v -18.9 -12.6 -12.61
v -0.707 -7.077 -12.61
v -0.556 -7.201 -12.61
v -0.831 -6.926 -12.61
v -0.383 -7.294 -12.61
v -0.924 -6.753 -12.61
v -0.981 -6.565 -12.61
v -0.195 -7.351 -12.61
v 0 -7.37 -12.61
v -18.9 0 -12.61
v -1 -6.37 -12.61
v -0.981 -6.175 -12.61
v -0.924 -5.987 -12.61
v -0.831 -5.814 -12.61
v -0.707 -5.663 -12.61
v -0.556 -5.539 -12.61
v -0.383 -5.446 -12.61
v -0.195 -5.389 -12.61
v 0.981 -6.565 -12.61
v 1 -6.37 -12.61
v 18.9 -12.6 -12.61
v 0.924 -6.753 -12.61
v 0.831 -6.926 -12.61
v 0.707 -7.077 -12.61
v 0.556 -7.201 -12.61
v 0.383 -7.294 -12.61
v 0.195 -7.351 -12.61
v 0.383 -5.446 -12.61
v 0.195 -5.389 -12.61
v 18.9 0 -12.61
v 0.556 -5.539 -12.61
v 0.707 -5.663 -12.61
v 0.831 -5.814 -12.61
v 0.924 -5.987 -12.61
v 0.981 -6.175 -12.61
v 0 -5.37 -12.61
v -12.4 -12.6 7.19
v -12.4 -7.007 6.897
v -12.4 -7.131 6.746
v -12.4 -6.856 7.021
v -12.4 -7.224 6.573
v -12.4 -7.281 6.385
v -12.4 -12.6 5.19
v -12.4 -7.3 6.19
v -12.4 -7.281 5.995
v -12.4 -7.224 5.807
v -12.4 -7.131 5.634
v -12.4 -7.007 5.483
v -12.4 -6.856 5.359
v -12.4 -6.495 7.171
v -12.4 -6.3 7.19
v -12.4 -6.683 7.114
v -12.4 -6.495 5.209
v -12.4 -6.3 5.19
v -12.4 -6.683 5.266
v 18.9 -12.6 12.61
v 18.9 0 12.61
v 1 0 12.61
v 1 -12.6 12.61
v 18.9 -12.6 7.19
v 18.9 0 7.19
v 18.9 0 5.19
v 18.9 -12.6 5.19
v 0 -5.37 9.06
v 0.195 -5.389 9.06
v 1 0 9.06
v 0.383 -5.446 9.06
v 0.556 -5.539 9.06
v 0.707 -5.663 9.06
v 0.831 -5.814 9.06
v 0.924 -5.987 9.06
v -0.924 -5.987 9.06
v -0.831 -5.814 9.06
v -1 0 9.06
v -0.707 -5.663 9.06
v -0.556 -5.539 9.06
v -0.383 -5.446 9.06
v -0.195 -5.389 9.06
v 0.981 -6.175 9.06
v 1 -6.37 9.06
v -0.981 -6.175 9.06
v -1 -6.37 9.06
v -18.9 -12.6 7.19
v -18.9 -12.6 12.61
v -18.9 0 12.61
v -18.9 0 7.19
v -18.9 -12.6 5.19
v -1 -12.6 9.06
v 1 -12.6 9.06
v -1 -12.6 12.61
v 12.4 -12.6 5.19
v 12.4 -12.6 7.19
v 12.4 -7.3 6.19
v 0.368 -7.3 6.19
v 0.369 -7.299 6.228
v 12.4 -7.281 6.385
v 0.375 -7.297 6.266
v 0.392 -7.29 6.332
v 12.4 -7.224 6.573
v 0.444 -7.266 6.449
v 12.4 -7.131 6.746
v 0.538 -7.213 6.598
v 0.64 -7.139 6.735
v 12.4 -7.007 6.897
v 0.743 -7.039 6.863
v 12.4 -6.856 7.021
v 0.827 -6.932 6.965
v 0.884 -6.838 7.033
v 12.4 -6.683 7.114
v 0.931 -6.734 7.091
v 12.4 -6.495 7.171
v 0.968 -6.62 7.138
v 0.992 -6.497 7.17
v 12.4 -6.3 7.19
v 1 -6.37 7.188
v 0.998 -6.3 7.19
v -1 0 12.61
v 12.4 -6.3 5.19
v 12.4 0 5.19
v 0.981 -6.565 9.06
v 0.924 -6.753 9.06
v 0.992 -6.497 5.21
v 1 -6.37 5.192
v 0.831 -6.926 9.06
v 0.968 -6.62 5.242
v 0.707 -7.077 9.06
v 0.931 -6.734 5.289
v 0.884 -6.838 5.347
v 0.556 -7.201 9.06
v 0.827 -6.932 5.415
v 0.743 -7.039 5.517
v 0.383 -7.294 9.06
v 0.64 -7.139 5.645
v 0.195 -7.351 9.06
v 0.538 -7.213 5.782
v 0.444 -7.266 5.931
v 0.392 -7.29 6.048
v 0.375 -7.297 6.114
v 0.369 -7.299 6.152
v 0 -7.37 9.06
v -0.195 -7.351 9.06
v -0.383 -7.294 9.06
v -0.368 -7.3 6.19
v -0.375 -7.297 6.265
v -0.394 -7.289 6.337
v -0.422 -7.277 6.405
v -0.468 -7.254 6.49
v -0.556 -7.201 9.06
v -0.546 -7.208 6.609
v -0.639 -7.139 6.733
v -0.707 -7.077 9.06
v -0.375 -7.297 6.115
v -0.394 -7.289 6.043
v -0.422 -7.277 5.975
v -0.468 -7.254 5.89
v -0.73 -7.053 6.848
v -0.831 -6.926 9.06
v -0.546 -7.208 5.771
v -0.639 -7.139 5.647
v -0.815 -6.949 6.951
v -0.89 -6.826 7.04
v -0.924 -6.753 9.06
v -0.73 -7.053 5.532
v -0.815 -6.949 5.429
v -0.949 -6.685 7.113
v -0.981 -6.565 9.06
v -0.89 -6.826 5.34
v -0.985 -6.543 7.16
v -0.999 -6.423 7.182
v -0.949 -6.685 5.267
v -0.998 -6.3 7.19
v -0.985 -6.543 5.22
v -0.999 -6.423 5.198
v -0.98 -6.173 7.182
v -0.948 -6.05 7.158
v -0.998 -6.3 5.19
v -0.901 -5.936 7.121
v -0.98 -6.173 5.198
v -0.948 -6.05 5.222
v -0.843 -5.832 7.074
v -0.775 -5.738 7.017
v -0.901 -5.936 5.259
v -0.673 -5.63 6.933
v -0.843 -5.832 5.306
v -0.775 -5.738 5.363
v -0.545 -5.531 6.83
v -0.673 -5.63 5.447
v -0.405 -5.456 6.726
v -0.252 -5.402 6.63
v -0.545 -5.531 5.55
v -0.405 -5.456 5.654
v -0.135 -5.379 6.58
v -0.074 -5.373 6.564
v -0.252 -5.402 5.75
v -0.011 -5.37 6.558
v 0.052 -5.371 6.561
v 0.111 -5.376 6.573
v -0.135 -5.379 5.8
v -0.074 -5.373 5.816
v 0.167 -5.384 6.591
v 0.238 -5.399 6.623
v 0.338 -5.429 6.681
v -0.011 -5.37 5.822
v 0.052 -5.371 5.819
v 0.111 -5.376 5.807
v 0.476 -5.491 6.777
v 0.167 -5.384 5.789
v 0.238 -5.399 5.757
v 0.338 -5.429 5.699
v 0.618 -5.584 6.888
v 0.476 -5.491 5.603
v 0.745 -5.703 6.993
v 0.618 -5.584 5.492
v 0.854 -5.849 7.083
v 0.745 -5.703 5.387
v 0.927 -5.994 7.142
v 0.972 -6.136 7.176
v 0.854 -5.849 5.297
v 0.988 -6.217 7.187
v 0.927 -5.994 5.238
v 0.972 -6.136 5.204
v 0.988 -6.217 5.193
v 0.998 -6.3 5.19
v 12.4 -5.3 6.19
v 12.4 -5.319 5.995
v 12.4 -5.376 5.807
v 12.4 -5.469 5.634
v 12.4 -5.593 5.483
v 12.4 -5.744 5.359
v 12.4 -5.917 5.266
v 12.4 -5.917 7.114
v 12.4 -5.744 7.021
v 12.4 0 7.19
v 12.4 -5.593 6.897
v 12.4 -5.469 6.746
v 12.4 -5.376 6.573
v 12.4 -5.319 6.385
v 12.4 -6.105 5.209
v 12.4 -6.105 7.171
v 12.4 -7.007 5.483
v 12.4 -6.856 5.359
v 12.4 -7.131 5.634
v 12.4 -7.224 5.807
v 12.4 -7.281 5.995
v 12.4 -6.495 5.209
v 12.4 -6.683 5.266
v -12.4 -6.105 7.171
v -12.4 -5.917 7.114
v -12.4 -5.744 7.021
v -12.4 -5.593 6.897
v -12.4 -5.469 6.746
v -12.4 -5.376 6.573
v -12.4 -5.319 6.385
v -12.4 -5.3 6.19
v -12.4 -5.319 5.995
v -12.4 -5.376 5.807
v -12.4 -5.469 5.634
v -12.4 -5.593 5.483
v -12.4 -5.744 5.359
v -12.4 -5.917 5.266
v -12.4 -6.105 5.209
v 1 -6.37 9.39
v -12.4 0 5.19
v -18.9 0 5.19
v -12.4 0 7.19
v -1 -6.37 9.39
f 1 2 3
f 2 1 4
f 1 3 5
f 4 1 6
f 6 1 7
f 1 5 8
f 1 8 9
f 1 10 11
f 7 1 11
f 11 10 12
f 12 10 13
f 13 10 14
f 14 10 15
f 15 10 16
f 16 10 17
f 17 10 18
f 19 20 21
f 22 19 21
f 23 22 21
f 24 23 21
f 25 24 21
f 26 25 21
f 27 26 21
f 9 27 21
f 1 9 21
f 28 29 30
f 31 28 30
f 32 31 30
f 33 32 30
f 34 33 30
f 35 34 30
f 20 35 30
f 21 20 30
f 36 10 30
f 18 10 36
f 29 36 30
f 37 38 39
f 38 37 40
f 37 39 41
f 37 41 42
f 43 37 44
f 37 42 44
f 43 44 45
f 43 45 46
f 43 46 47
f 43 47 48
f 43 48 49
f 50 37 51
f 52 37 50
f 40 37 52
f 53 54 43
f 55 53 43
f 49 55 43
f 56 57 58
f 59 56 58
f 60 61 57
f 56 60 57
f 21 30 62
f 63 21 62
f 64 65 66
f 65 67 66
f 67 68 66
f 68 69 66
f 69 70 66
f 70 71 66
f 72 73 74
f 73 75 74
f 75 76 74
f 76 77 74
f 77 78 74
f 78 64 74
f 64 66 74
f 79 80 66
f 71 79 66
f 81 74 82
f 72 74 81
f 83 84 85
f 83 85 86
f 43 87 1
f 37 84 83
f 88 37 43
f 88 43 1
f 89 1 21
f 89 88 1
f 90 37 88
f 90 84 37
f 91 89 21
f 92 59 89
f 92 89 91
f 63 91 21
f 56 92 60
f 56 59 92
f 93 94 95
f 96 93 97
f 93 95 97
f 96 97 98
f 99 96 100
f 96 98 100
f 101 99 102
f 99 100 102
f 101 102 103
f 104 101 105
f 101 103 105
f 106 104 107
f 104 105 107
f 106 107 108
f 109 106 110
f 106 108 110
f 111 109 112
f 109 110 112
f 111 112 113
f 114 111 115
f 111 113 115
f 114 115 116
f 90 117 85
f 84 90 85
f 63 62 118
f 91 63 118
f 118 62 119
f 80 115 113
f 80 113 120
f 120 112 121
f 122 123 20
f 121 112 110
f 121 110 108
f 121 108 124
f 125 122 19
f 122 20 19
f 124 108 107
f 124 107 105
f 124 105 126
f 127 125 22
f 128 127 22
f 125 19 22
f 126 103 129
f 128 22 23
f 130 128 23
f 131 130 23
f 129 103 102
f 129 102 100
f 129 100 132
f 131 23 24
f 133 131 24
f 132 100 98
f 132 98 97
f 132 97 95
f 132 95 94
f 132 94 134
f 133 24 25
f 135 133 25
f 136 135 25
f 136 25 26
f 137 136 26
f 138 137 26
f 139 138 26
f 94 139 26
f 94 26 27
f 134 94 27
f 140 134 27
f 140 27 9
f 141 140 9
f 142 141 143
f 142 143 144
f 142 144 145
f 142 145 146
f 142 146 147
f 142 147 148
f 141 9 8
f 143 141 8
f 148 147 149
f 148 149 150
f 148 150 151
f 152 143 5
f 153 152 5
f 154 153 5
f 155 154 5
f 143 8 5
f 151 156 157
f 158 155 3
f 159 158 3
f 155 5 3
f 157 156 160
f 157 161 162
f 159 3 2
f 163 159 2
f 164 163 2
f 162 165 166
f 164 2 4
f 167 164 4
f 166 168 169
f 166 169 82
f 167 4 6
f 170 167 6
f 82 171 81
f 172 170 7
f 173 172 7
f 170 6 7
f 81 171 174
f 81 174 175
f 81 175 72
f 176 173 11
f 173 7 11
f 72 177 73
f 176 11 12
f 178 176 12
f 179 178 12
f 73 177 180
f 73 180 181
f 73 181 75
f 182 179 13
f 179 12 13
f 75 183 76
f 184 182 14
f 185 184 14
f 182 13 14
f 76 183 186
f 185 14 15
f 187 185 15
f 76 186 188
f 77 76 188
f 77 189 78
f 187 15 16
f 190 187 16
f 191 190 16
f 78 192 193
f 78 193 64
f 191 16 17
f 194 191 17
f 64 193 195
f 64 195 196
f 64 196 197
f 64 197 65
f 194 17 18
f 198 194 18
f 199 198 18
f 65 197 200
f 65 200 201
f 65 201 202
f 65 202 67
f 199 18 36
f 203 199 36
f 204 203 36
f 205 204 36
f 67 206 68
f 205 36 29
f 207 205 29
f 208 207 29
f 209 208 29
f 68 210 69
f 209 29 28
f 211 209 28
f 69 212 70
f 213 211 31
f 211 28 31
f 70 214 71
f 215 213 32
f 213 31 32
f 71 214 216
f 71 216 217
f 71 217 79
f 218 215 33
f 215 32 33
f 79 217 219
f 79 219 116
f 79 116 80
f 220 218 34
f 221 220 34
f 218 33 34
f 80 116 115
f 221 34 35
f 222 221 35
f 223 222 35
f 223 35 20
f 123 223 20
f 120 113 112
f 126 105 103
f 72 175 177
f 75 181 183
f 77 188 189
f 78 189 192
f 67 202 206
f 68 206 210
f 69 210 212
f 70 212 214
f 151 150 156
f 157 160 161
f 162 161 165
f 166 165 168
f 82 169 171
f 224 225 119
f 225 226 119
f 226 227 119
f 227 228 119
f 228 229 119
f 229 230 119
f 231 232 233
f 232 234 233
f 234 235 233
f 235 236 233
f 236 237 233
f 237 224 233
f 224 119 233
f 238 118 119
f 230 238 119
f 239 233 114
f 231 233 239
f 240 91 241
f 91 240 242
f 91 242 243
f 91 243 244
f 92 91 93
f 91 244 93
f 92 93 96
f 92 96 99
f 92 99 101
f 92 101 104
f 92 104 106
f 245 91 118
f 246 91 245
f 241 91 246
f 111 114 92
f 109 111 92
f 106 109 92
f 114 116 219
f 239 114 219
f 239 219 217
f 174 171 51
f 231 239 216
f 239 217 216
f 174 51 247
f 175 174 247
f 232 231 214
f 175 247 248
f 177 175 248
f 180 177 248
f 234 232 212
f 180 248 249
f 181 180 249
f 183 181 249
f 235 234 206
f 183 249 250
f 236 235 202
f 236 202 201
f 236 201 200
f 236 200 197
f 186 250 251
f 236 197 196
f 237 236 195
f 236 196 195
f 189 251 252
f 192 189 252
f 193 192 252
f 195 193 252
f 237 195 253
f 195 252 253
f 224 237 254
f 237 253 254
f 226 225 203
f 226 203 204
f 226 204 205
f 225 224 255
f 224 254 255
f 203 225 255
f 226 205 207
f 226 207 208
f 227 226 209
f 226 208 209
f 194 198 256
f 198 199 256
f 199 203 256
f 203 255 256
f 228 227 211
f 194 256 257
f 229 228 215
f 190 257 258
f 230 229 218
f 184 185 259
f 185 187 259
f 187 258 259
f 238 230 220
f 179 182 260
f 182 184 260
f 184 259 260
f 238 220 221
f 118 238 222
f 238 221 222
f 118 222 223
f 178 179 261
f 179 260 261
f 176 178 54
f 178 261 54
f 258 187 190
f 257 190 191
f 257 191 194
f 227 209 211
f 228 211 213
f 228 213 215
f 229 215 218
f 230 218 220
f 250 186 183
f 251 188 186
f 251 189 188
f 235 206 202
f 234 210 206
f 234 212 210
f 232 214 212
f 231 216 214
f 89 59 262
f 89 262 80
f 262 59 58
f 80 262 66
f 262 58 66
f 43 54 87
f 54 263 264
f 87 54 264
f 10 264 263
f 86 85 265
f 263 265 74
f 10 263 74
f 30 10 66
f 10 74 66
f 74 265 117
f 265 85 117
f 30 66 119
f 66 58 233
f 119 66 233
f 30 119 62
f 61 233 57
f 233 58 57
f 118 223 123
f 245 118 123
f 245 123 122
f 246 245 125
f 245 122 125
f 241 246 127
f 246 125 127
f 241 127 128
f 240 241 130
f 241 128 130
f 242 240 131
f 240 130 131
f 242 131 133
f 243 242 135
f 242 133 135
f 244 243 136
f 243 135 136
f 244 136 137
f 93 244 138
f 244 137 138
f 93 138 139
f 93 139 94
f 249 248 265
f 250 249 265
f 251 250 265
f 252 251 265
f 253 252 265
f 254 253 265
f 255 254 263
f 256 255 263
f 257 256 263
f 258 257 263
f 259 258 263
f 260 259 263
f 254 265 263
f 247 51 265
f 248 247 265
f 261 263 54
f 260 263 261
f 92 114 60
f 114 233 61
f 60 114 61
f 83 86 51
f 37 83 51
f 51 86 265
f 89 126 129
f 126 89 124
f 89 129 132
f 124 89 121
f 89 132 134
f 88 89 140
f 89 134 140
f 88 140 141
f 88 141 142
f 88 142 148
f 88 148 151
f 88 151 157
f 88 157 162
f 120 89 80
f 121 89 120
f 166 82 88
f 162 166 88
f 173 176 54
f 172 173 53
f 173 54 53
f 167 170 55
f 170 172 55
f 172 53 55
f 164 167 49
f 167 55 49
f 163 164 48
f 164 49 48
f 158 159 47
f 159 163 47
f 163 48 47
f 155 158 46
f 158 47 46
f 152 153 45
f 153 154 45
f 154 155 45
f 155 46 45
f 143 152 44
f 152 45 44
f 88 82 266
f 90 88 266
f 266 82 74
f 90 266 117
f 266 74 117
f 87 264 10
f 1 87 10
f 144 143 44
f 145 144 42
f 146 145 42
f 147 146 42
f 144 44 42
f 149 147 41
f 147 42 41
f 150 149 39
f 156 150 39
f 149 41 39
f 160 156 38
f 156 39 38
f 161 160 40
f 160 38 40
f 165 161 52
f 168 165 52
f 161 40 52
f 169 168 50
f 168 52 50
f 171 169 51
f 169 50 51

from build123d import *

# Parameters (mm, degrees)
F1_DEPTH = 12.6
F2_R     = 1
F3_DEPTH = 22
F5_DEPTH = 31.301


# Not quite as in the source:
# - a feature names something its author has since deleted; it is built from what else it names


with BuildPart() as f1:
    # F0 (on Front) → F1 (new body)
    with BuildSketch(Plane.XZ):
        Polygon((-1, 12.61), (-18.9, 12.61), (-18.9, 7.19), (-12.4, 7.19), (-12.4, 5.19), (-18.9, 5.19), (-18.9, -12.61), (18.9, -12.61), (18.9, 5.19), (12.4, 5.19), (12.4, 7.19), (18.9, 7.19), (18.9, 12.61), (1, 12.61), (1, 9.06), (0, 9.06), (-1, 9.06), align=None)
    extrude(amount=F1_DEPTH)

    # F2 (on face) → F3 (cut)
    with BuildSketch(Plane(origin=(0, 0, -12.61), x_dir=(1, 0, 0), z_dir=(0, 0, -1))):
        with Locations((0, 6.37)):
            Circle(F2_R)
    extrude(amount=-F3_DEPTH, mode=Mode.SUBTRACT)

    # F4 (on face) → F5 (cut, through all)
    with BuildSketch(Plane(origin=(-12.4, 0, 0), x_dir=(0, -1, 0), z_dir=(-1, 0, 0))):
        with BuildLine():
            ThreePointArc((6.3, 5.19), (7.0071067812, 5.4828932188), (7.3, 6.19))
            ThreePointArc((7.3, 6.19), (7.0071067812, 6.8971067812), (6.3, 7.19))
            ThreePointArc((6.3, 7.19), (5.3, 6.19), (6.3, 5.19))
        make_face()
    extrude(amount=-F5_DEPTH, mode=Mode.SUBTRACT)


solid = f1.part
